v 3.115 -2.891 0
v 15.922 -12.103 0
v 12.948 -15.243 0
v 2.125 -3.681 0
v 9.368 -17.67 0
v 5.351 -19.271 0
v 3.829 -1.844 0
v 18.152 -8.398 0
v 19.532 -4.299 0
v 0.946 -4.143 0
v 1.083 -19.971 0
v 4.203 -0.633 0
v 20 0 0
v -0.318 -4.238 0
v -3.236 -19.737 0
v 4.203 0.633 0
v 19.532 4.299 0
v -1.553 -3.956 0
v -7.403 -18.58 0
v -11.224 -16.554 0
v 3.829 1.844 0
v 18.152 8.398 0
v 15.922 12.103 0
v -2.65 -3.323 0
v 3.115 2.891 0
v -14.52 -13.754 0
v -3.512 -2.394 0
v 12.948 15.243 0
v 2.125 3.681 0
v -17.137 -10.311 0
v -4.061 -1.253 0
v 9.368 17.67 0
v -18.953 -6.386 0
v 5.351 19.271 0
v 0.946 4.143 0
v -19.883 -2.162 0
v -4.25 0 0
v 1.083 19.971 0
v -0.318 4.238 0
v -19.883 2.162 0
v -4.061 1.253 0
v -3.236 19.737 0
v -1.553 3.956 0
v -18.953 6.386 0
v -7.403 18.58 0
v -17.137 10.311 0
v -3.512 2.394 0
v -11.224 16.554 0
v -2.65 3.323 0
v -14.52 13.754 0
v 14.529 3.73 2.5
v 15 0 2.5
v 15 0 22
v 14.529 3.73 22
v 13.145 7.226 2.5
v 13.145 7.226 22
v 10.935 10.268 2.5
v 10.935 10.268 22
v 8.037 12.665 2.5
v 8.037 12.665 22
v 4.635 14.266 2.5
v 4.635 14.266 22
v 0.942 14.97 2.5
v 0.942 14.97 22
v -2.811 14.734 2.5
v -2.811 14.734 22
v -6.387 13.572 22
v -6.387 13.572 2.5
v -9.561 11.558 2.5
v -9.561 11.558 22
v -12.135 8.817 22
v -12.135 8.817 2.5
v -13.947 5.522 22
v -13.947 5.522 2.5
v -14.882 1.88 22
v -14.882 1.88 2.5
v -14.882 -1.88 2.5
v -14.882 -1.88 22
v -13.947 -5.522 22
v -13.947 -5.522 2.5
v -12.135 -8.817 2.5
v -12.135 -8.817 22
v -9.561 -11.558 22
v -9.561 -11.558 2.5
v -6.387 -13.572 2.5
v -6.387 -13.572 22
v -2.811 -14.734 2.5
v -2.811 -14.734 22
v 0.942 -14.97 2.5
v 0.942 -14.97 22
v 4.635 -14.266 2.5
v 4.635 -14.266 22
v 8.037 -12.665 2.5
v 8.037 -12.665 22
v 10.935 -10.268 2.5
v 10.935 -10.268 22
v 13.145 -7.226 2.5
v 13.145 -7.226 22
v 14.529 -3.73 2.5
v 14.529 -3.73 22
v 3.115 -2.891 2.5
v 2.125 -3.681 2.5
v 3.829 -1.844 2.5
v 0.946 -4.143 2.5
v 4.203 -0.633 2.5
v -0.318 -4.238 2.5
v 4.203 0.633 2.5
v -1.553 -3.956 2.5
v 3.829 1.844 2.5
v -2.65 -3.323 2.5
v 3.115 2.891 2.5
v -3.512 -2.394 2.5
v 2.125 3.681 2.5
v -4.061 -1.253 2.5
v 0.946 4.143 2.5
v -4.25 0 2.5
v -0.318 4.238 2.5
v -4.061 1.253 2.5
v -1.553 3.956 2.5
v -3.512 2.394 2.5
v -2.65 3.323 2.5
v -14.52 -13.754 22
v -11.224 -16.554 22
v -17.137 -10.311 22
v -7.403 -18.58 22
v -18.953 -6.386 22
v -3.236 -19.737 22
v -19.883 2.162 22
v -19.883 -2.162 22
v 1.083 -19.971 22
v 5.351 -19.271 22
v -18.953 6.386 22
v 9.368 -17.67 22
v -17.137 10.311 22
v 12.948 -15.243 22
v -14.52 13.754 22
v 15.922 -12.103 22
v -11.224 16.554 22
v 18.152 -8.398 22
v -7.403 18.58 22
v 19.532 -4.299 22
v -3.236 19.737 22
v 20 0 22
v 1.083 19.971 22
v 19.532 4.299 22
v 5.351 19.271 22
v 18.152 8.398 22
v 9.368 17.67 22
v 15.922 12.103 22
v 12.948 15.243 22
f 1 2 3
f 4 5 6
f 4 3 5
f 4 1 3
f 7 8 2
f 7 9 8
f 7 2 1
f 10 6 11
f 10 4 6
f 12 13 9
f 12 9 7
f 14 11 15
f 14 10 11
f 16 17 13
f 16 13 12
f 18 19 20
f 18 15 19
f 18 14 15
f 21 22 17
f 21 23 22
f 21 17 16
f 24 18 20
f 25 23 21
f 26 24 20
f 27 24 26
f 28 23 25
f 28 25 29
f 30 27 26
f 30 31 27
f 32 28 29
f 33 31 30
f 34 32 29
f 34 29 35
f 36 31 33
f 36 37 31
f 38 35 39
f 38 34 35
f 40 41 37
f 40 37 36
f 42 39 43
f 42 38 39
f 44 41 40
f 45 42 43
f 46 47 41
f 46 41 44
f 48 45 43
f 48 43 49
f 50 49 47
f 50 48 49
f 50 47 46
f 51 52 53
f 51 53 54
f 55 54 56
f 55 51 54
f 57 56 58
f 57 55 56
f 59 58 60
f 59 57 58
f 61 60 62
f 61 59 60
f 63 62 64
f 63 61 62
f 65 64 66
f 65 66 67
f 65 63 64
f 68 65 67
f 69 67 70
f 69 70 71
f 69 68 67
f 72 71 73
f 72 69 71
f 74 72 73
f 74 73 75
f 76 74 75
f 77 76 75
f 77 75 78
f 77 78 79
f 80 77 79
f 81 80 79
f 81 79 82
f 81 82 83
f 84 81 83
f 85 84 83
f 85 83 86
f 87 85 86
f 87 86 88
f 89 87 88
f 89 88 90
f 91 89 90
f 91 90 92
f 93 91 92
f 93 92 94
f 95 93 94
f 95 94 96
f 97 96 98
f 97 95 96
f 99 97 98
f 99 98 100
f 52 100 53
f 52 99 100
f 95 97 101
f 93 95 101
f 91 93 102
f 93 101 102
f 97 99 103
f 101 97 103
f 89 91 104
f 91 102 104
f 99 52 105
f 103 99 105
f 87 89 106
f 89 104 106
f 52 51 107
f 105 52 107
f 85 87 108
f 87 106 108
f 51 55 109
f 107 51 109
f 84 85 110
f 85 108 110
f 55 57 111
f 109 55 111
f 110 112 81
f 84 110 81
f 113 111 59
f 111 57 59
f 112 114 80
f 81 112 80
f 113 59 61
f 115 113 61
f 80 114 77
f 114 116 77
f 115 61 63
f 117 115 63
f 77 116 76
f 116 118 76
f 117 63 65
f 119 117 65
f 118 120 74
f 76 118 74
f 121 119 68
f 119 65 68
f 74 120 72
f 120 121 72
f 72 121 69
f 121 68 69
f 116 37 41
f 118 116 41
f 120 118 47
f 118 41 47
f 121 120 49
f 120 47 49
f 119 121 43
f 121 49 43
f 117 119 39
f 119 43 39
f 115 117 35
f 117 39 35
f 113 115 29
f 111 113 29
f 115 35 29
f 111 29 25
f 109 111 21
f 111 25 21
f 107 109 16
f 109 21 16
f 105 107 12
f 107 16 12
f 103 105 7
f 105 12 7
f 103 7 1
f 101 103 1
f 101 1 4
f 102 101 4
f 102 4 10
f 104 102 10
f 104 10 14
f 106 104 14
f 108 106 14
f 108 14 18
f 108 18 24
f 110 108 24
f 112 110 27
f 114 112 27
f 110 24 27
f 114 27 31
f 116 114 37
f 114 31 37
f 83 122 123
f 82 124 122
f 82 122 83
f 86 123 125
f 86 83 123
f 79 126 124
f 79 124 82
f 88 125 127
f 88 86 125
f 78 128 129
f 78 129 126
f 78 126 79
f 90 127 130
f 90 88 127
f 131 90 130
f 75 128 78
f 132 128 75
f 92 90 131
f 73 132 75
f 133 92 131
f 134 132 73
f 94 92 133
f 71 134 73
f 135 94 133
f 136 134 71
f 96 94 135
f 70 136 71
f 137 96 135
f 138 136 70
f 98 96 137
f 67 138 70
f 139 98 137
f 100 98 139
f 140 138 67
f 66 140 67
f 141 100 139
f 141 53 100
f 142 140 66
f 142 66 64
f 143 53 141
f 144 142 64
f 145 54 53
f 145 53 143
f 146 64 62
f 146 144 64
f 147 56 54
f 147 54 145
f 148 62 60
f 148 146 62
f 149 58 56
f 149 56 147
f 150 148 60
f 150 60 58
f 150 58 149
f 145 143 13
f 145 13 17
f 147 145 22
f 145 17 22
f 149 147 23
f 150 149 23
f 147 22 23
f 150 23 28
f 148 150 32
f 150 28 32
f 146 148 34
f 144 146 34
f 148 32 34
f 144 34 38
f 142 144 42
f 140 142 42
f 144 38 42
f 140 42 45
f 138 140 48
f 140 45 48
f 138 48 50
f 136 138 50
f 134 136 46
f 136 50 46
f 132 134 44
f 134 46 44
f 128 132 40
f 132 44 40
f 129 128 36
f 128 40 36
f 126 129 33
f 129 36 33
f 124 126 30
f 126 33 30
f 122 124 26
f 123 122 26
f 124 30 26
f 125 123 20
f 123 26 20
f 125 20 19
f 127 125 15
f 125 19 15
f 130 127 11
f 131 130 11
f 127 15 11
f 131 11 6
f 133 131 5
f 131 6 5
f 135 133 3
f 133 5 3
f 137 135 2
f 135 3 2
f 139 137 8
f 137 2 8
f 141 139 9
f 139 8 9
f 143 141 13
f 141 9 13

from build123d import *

# Parameters (mm, degrees)
ESQUISSE1_R             = 20
ESQUISSE1_R_2           = 15
BOSS_EXTRU_1_DEPTH      = 22
ESQUISSE5_R             = 15
BOSS_EXTRU_3_DEPTH      = 2.5
ESQUISSE12_R            = 4.25
ENL_V_MAT_EXTRU_2_DEPTH = 2.5


with BuildPart() as part:
    # Esquisse1 → Boss.-Extru.1 (new body)
    with BuildSketch(Plane.XY):
        Circle(ESQUISSE1_R)
        Circle(ESQUISSE1_R_2, mode=Mode.SUBTRACT)
    extrude(amount=BOSS_EXTRU_1_DEPTH)

    # Esquisse5 → Boss.-Extru.3 (add)
    with BuildSketch(Plane(origin=(0, 0, 0), x_dir=(-1, 0, 0), z_dir=(0, 0, -1))):
        Circle(ESQUISSE5_R)
    extrude(amount=-BOSS_EXTRU_3_DEPTH)

    # Esquisse12 → Enlèv. mat.-Extru.2 (cut)
    with BuildSketch(Plane(origin=(0, 0, 0), x_dir=(-1, 0, 0), z_dir=(0, 0, -1))):
        Circle(ESQUISSE12_R)
    extrude(amount=-ENL_V_MAT_EXTRU_2_DEPTH, mode=Mode.SUBTRACT)


solid = part.part
